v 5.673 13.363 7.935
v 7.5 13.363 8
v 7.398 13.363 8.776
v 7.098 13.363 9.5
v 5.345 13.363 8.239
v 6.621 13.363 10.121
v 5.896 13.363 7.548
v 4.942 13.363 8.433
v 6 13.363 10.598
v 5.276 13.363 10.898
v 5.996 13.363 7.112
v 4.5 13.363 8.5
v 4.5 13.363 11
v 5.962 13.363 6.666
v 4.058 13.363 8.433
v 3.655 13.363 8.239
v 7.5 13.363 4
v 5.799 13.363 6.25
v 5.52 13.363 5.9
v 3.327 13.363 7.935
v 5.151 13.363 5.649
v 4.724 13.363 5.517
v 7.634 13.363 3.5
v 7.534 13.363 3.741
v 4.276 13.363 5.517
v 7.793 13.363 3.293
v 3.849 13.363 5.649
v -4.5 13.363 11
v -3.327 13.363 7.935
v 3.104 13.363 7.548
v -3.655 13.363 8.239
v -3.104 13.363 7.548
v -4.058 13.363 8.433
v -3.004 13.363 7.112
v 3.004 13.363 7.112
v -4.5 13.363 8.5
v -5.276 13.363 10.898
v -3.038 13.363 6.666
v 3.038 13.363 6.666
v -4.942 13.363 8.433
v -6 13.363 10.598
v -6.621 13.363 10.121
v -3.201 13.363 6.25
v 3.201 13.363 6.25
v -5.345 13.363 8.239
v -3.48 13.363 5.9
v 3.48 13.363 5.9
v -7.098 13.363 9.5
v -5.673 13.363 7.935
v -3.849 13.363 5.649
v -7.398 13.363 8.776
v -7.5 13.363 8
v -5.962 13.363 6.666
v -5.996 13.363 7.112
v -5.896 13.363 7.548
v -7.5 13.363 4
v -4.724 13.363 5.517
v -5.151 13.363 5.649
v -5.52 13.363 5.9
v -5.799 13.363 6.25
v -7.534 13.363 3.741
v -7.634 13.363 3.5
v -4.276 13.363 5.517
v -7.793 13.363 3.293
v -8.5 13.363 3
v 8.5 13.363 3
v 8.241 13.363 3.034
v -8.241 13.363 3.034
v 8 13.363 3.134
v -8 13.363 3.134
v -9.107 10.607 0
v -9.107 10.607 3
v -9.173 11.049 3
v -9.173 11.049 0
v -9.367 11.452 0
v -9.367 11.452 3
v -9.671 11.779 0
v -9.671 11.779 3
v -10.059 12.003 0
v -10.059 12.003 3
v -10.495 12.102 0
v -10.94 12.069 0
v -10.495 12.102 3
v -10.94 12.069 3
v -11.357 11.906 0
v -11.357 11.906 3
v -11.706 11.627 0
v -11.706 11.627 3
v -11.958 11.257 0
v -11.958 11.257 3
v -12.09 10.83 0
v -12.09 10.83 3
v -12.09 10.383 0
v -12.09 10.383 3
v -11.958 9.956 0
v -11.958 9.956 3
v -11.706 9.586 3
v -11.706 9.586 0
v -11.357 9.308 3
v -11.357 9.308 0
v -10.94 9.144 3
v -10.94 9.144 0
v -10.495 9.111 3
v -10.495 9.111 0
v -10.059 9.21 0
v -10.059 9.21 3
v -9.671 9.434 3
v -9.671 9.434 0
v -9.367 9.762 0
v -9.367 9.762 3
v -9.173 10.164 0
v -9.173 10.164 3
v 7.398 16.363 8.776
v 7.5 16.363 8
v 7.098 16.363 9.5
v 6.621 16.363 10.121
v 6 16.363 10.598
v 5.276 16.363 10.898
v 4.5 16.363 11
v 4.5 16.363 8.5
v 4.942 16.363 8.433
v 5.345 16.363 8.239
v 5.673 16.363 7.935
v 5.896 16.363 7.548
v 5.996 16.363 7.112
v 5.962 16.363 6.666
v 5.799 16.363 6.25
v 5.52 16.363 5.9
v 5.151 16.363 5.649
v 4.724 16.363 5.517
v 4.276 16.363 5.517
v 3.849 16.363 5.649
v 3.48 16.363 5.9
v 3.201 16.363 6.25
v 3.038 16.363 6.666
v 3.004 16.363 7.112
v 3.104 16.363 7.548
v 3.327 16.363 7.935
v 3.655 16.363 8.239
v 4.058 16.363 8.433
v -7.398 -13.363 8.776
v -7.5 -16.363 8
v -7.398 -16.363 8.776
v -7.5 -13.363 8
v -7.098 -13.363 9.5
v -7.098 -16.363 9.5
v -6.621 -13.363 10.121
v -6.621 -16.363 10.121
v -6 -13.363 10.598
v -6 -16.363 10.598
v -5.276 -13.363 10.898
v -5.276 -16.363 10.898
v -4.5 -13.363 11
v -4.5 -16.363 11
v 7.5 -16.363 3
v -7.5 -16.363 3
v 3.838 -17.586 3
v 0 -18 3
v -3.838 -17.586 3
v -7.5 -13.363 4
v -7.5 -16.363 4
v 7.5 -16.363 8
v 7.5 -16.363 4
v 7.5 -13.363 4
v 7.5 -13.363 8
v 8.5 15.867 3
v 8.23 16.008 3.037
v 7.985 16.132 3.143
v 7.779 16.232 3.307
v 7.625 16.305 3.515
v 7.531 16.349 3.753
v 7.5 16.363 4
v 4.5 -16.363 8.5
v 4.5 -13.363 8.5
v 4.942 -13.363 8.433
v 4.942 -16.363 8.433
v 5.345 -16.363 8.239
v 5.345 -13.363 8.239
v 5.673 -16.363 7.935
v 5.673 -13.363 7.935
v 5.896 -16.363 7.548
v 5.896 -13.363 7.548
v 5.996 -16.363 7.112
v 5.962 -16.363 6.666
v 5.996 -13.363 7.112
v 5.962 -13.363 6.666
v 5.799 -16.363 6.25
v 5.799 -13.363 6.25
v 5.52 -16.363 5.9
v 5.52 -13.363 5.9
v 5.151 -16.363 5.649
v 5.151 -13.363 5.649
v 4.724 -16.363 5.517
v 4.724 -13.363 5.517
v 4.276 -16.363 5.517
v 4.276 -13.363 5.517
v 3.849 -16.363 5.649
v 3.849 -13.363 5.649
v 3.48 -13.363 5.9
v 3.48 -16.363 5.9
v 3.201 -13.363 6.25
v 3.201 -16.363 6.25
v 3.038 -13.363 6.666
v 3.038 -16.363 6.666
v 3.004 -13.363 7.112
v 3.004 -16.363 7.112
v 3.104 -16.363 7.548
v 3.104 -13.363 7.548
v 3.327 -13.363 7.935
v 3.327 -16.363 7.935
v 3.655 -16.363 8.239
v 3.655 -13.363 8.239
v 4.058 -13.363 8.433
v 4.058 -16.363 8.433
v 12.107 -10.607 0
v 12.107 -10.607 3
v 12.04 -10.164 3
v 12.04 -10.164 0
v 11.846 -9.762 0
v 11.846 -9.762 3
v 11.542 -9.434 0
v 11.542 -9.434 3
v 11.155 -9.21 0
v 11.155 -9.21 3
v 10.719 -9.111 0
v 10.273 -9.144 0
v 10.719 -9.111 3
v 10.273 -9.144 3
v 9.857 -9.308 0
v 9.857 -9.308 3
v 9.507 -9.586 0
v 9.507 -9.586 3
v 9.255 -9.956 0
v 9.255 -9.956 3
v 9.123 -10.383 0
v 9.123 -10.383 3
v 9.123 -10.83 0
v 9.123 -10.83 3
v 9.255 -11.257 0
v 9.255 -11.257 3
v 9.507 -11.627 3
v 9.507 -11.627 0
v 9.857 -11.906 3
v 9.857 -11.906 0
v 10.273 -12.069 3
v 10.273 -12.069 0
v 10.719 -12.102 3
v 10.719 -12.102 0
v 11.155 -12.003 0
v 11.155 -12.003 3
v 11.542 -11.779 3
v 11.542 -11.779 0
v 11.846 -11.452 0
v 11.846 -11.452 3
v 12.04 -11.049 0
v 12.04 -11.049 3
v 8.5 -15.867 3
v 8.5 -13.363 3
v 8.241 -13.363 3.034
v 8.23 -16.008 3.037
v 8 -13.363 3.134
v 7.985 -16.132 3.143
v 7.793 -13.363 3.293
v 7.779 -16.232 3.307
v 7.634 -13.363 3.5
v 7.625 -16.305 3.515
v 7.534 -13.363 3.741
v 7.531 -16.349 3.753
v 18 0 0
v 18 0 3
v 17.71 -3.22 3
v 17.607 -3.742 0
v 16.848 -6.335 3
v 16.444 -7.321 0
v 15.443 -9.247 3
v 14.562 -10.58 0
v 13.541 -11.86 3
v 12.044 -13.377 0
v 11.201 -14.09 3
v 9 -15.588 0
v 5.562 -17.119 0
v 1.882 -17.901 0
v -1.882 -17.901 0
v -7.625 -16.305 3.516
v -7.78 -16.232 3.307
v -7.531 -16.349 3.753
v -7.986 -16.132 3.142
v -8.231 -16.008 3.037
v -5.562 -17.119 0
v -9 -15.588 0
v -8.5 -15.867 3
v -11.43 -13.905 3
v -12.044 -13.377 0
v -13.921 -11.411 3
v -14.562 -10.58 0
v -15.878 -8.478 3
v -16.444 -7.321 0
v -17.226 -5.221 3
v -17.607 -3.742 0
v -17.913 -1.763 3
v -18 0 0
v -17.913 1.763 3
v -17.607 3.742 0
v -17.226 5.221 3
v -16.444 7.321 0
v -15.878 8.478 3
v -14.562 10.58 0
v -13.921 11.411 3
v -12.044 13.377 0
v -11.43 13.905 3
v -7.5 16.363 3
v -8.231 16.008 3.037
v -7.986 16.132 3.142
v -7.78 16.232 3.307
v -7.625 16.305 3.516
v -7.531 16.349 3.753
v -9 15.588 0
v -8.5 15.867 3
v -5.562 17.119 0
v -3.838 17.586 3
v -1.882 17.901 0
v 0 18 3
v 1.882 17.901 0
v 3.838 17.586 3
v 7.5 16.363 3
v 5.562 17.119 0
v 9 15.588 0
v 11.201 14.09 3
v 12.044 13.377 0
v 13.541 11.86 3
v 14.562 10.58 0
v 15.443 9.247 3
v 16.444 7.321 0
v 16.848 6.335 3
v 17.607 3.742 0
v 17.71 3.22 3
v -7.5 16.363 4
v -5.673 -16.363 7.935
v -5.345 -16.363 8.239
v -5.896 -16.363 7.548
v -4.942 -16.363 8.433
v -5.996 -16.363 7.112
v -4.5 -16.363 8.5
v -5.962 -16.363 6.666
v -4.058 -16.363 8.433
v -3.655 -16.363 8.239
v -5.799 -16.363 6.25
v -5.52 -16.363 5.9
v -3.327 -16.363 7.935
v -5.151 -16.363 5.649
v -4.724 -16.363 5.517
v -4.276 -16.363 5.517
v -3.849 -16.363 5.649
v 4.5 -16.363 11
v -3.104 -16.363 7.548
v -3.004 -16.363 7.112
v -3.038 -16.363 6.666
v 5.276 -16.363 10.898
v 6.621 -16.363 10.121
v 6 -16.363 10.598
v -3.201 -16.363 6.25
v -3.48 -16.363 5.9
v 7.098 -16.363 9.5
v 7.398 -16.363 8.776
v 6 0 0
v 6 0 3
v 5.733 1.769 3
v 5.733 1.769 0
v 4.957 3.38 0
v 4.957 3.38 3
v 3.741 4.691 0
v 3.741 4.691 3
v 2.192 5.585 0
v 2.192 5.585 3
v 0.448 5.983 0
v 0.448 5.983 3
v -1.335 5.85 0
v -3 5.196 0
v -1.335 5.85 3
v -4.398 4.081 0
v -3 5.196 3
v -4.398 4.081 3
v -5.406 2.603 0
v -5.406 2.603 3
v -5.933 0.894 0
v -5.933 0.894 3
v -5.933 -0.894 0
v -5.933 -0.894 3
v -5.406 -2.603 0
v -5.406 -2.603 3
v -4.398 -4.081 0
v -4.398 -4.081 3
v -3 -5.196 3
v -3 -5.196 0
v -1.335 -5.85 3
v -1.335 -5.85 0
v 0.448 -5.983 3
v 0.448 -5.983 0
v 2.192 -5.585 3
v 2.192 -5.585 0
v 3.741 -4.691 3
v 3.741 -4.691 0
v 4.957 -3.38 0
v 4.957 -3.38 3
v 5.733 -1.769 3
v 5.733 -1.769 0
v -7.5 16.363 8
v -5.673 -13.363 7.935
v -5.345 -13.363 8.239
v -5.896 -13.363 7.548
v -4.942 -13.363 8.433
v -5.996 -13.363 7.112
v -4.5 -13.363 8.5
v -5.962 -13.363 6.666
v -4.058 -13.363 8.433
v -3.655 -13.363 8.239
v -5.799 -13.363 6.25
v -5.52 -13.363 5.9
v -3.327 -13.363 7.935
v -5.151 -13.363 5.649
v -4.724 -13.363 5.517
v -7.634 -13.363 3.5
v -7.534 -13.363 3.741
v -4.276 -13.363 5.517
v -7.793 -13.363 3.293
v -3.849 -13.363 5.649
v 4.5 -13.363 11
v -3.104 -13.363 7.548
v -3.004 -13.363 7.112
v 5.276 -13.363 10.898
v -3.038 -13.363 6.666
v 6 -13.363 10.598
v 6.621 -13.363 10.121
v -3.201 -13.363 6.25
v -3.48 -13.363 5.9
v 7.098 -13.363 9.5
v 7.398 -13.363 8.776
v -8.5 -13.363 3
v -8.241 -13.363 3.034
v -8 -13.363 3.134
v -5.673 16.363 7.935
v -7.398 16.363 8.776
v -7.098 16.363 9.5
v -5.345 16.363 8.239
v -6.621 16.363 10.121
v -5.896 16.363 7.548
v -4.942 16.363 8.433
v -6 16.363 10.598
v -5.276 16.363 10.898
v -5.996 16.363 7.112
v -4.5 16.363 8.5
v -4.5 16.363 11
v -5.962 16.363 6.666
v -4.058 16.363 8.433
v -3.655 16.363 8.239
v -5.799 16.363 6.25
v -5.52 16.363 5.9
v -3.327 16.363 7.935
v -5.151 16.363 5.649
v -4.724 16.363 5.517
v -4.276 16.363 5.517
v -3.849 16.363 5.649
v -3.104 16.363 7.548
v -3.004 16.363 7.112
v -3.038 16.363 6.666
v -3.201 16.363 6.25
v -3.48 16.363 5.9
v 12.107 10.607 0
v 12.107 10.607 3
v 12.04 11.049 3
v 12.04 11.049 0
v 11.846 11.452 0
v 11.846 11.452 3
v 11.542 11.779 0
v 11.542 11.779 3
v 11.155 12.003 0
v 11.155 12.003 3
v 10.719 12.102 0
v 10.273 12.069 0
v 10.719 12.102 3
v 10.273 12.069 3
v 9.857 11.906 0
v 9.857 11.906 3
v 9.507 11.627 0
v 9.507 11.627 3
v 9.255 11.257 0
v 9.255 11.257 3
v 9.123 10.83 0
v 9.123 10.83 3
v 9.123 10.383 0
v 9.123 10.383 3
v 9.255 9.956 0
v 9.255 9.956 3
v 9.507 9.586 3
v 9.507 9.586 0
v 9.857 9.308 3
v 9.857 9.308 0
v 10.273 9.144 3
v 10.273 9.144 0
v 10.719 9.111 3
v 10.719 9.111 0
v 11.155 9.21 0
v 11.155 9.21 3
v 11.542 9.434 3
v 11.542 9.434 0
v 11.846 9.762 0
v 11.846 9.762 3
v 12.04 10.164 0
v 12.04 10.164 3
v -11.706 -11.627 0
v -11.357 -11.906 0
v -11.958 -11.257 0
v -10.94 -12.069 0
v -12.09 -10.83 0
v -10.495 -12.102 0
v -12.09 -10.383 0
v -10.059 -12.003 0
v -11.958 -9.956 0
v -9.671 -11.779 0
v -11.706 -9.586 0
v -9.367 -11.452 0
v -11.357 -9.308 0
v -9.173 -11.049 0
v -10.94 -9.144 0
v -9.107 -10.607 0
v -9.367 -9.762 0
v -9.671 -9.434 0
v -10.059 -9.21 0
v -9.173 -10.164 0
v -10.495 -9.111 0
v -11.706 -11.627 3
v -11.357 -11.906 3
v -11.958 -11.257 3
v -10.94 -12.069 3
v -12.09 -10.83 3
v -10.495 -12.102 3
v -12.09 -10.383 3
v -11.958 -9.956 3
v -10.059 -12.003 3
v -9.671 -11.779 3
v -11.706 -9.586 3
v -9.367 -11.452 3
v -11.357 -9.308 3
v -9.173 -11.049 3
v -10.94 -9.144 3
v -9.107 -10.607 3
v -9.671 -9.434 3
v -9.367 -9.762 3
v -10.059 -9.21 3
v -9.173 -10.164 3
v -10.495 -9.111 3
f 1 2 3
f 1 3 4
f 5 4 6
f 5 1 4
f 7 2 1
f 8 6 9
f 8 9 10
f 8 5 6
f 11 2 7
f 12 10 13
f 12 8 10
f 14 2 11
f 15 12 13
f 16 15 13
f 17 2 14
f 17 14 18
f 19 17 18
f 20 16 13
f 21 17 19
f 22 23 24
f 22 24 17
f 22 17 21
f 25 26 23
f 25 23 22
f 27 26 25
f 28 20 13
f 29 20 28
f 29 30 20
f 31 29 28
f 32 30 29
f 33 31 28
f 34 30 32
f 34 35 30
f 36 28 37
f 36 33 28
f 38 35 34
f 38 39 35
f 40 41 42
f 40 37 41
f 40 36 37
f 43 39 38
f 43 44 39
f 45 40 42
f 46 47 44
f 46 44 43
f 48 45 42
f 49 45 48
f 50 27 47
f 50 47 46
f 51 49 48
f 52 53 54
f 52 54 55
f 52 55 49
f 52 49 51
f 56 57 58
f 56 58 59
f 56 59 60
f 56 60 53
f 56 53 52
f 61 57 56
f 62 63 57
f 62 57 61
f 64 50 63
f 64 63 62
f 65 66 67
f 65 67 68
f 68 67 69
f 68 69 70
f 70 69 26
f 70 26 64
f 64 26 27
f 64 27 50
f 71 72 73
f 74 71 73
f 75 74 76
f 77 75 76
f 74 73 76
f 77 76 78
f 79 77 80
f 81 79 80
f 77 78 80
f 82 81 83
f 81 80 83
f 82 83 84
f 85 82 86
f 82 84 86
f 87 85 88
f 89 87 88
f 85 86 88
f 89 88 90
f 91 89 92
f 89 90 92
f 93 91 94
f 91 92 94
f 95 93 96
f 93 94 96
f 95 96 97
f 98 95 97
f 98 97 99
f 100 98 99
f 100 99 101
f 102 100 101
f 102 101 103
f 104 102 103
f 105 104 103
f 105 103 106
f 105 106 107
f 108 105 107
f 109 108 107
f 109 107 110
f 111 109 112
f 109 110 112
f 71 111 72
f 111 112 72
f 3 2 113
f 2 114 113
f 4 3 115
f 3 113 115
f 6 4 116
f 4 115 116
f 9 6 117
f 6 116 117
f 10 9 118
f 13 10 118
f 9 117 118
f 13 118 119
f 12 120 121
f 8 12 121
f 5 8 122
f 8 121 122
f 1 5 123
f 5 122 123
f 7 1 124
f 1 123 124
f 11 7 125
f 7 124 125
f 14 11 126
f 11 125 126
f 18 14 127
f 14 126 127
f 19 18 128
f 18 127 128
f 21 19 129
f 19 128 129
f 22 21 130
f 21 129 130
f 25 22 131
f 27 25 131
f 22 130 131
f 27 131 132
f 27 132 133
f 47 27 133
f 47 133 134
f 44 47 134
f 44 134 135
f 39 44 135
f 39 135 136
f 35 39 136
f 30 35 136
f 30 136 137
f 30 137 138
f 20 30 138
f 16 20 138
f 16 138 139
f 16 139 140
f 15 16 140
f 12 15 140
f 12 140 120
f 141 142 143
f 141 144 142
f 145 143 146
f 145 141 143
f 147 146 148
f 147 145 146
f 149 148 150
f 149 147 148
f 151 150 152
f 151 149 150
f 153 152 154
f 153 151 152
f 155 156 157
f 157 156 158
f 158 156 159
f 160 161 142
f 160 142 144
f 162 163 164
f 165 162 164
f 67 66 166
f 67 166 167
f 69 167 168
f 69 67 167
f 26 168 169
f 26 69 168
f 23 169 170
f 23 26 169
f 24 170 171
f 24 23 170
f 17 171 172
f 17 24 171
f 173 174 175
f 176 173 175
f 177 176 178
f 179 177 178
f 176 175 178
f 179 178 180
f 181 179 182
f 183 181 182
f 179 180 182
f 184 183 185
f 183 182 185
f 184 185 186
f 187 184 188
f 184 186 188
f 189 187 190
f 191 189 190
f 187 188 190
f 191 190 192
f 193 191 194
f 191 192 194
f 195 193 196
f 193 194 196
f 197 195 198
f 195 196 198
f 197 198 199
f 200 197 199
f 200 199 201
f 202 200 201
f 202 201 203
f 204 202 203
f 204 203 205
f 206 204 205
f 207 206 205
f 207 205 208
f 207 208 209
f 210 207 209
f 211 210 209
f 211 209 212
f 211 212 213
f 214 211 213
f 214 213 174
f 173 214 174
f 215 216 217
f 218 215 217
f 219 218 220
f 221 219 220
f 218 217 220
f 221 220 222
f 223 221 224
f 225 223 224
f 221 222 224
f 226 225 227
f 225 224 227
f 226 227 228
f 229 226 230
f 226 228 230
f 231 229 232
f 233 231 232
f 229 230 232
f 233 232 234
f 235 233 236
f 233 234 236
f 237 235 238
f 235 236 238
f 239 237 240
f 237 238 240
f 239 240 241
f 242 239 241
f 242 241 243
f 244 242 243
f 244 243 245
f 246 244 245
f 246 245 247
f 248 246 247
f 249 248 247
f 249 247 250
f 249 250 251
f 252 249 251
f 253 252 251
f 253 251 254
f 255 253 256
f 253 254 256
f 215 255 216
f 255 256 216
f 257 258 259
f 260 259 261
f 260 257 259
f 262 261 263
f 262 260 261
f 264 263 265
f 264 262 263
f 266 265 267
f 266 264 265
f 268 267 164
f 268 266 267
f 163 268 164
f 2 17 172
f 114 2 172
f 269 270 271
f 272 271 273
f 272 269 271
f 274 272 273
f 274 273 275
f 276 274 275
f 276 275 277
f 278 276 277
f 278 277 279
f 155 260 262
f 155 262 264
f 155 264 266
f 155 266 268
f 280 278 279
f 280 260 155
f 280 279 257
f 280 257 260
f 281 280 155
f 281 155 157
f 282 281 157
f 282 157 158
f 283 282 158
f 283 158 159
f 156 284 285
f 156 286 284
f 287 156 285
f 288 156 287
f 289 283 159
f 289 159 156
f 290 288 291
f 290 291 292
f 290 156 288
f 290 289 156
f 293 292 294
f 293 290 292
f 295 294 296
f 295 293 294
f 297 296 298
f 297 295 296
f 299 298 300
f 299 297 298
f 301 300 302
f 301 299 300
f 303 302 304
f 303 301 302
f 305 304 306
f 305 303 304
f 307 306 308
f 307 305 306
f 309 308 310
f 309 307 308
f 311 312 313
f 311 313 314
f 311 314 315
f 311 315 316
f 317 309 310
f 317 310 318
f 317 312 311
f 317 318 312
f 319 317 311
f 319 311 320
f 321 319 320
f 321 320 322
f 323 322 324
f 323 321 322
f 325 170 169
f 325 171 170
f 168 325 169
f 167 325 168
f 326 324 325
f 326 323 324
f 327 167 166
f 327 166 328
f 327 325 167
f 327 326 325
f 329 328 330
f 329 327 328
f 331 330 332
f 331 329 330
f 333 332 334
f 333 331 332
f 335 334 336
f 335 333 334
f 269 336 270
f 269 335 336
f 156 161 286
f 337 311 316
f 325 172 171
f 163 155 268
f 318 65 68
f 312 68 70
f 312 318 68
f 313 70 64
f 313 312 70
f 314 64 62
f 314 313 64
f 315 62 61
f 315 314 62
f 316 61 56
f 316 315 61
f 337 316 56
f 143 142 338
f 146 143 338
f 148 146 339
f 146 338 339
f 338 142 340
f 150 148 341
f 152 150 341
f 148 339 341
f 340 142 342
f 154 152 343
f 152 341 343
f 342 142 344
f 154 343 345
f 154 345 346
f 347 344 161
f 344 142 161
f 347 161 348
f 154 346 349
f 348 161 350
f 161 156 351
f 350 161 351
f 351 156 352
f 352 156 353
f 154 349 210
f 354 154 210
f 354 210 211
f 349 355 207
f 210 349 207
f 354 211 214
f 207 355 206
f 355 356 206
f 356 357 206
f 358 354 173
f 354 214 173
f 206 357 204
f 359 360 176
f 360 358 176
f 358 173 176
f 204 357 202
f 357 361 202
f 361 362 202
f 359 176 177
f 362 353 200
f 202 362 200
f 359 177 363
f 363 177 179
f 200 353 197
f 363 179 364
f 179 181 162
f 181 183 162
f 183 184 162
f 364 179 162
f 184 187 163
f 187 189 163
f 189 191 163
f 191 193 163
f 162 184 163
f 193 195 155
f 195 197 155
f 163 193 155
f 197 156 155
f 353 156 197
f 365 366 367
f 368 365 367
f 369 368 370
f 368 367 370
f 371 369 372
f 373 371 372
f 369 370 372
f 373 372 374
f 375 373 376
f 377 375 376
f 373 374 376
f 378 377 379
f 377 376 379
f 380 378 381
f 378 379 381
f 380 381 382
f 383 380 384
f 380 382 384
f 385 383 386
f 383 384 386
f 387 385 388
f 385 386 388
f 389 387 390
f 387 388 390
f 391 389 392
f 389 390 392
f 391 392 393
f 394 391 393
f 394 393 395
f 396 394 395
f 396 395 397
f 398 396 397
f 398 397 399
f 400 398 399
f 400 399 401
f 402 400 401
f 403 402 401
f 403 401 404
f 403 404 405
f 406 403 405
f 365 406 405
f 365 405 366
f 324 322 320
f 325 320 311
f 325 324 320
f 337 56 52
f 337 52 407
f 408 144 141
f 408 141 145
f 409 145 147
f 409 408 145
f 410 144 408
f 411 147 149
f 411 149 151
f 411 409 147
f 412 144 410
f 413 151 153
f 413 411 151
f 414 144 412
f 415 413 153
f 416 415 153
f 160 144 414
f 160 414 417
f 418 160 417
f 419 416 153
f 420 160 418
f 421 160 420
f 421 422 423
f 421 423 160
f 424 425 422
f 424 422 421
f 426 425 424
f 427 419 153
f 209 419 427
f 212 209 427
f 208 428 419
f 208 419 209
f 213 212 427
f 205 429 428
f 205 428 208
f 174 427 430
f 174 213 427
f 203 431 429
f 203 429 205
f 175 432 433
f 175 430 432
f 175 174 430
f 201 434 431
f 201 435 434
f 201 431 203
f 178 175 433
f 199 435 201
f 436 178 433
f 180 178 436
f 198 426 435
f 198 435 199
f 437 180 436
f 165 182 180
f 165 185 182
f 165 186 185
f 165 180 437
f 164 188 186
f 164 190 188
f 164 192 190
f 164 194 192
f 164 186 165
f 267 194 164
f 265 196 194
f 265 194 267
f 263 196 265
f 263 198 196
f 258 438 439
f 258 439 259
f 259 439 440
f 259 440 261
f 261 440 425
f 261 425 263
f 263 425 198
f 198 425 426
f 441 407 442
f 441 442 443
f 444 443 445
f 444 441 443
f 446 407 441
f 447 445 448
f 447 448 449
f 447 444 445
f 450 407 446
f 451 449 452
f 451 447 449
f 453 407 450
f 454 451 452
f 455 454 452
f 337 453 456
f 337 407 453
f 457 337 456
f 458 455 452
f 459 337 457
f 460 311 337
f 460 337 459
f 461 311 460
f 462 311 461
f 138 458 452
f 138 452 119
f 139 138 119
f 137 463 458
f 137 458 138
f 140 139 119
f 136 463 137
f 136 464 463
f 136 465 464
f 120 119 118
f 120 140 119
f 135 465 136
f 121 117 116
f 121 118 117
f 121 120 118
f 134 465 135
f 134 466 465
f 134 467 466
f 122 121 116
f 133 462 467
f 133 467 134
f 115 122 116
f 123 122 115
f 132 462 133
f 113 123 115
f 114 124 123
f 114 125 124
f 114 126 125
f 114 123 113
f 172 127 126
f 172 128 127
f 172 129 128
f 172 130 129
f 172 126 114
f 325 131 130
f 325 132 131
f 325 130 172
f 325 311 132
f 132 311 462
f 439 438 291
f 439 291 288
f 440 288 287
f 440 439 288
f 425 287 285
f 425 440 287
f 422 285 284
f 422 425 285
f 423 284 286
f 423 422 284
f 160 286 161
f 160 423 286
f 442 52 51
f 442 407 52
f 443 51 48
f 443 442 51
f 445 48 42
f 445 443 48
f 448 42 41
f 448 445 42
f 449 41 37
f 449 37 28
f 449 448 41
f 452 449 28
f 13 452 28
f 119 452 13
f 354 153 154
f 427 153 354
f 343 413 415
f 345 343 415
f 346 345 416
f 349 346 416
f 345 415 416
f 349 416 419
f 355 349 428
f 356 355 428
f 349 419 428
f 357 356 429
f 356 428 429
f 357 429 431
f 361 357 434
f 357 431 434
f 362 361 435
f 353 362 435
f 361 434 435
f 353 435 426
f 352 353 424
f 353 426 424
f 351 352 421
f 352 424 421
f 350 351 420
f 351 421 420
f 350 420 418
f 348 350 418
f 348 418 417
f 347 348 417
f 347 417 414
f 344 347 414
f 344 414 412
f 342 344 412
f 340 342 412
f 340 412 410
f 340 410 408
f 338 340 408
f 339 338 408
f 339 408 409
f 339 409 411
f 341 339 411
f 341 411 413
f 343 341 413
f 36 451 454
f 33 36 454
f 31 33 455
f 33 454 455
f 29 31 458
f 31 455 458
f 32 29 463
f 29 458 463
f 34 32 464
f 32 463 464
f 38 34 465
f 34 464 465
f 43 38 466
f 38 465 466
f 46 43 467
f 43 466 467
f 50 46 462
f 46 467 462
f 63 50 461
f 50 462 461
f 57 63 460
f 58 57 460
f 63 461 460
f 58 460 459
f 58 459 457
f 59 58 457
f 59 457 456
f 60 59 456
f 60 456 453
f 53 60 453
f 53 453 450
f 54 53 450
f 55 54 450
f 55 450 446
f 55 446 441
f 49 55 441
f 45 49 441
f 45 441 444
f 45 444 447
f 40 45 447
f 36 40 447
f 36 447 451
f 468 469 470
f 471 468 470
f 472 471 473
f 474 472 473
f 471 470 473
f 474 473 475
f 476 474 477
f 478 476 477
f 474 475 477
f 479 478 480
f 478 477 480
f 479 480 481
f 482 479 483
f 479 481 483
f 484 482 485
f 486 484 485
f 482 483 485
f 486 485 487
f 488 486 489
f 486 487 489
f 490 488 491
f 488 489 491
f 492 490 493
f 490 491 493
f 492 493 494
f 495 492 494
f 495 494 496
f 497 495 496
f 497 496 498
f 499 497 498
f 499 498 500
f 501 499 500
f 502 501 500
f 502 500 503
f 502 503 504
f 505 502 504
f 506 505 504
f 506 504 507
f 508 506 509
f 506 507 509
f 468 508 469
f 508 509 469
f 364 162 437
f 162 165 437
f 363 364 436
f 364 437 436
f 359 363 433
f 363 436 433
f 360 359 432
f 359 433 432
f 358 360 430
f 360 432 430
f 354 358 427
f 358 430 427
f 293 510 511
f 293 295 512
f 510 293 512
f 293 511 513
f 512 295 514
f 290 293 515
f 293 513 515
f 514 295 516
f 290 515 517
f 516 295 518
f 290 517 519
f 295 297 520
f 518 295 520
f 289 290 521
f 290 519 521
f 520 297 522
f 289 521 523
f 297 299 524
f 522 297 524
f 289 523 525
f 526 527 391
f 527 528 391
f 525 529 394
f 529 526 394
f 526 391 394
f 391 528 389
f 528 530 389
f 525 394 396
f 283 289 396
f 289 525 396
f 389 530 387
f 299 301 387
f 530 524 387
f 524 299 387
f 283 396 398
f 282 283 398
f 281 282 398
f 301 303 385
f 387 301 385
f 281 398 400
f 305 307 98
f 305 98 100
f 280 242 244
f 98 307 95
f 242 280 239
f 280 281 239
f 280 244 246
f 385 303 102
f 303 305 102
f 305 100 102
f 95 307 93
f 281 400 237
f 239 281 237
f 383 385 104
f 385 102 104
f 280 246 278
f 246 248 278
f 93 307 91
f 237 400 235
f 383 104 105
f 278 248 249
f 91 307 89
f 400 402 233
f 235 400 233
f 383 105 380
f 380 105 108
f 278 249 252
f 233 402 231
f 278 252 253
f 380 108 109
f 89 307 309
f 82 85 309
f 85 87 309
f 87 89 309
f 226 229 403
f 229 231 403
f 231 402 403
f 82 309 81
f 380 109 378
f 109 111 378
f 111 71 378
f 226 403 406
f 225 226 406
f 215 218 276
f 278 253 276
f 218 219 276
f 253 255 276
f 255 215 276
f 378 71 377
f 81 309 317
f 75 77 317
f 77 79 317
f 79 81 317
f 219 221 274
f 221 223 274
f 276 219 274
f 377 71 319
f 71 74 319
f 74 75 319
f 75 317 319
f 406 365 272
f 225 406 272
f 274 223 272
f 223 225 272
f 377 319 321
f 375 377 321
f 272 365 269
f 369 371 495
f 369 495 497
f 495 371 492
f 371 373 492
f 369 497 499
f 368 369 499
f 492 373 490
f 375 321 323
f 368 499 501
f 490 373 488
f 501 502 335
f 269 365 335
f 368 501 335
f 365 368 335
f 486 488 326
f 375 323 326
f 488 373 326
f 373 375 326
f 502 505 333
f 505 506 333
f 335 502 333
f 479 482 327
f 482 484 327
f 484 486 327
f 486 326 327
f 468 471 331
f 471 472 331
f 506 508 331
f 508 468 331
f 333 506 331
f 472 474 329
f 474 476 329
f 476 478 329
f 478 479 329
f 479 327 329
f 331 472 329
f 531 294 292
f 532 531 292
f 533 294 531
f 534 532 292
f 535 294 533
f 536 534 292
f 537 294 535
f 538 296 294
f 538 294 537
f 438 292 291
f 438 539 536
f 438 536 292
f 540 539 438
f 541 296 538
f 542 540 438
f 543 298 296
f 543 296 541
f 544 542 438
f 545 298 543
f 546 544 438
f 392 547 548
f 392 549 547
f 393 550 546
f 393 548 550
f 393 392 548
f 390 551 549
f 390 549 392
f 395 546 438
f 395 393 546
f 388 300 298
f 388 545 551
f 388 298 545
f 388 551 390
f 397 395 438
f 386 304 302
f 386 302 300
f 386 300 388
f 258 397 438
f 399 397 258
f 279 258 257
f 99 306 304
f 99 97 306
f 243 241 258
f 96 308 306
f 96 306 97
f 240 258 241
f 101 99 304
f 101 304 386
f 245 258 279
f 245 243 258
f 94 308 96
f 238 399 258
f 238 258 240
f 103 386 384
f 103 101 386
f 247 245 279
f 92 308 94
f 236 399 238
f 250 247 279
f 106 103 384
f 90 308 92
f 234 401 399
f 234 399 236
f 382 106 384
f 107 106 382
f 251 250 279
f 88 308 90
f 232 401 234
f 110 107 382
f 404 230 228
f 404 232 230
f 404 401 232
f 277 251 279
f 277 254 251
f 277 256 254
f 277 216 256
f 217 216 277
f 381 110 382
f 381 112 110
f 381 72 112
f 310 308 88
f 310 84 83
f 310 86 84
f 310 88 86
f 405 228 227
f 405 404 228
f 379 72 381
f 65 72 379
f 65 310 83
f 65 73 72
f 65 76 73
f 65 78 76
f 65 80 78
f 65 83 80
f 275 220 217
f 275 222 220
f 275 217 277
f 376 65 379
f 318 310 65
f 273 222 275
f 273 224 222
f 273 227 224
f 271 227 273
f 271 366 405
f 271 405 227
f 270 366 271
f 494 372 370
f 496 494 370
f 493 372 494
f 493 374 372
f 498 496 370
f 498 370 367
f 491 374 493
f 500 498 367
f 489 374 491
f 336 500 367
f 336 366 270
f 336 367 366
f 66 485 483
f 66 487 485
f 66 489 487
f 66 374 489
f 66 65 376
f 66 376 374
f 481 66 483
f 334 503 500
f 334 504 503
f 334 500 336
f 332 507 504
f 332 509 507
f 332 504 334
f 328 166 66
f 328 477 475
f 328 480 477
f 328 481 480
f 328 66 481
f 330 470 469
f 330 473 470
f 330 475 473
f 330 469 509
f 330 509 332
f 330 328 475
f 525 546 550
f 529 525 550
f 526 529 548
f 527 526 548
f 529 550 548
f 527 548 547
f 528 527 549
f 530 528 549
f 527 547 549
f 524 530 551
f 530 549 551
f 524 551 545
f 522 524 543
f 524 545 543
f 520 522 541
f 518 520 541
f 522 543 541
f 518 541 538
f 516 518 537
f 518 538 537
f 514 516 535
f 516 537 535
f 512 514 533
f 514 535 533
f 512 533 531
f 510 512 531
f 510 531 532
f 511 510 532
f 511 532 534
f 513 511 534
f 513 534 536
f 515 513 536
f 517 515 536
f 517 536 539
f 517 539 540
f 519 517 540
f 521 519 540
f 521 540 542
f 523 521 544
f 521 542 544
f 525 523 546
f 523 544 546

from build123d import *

# Parameters (mm, degrees)
SKETCH_1_R          = 18
EXTRUDE_1_DEPTH     = 3
SKETCH_2_R          = 1.5
CUT_EXTRUDE_1_DEPTH = 3
SKETCH_4_W          = 15
SKETCH_4_H          = 3
EXTRUDE_2_DEPTH     = 8
SKETCH_5_R          = 1.5
CUT_EXTRUDE_2_DEPTH = 37
FILLET_1_R          = 3
FILLET_2_R          = 1
SKETCH_6_R          = 6
CUT_EXTRUDE_3_DEPTH = 37


with BuildPart() as part:
    # Эскиз1 → Бобышка-Вытянуть1 (new body)
    with BuildSketch(Plane.XY):
        Circle(SKETCH_1_R)
    extrude(amount=EXTRUDE_1_DEPTH)

    # Эскиз2 → Вырез-Вытянуть1 (cut)
    with BuildSketch(Plane.XY.offset(3)):
        with Locations((-10.606601718, -10.606601718)):
            Circle(SKETCH_2_R)
        with Locations((10.606601718, -10.606601718)):
            Circle(SKETCH_2_R)
        with Locations((10.606601718, 10.606601718)):
            Circle(SKETCH_2_R)
        with Locations((-10.606601718, 10.606601718)):
            Circle(SKETCH_2_R)
    extrude(amount=-CUT_EXTRUDE_1_DEPTH, mode=Mode.SUBTRACT)

    # Эскиз4 → Бобышка-Вытянуть2 (add)
    with BuildSketch(Plane.XY.offset(3)):
        with Locations((0, 14.863068172)):
            Rectangle(SKETCH_4_W, SKETCH_4_H)
        with Locations((0, -14.863068172)):
            Rectangle(SKETCH_4_W, SKETCH_4_H)
    extrude(amount=EXTRUDE_2_DEPTH)

    # Эскиз5 → Вырез-Вытянуть2 (cut)
    with BuildSketch(Plane(origin=(0, 16.363068172, 0), x_dir=(1, 0, 0), z_dir=(0, 1, 0))):
        with Locations(Location((-4.5, -7, 0), (0, 0, 270))):
            Circle(SKETCH_5_R)
        with Locations(Location((4.5, -7, 0), (0, 0, 270))):
            Circle(SKETCH_5_R)
    extrude(amount=-CUT_EXTRUDE_2_DEPTH, mode=Mode.SUBTRACT)

    # Скругление1
    fillet_1_edges = [part.edges().sort_by_distance(p)[0] for p in [
        (-7.5, 14.863068172, 11),
        (7.5, 14.863068172, 11),
        (7.5, -14.863068172, 11),
        (-7.5, -14.863068172, 11),
    ]]
    fillet(fillet_1_edges, radius=FILLET_1_R)

    # Скругление2
    # the kernel refuses this fillet: 1 mm, written as the material it adds along each edge
    with BuildSketch(Plane(origin=(-7.5, 16.363068172, 3), x_dir=(-1, 0, 0), z_dir=(0, -1, 0))) as fillet_2_piece_1_section:
        with BuildLine():
            CenterArc((FILLET_2_R, -FILLET_2_R), FILLET_2_R, 90, 90)
            Line((0, -FILLET_2_R), (0, 0))
            Line((0, 0), (FILLET_2_R, 0))
        make_face()
    fillet_2_piece_1 = extrude(amount=3, mode=Mode.PRIVATE)
    fillet_2_piece_1 = fillet_2_piece_1 & Plane(origin=(0, 0, 3.230923565), x_dir=(1, 0, 0), z_dir=(0, 0, -1)) * Cylinder(18, 11, mode=Mode.PRIVATE)
    add(fillet_2_piece_1)
    with BuildSketch(Plane(origin=(7.5, 13.363068172, 3), x_dir=(1, 0, 0), z_dir=(0, 1, 0))) as fillet_2_piece_2_section:
        with BuildLine():
            CenterArc((FILLET_2_R, -FILLET_2_R), FILLET_2_R, 90, 90)
            Line((0, -FILLET_2_R), (0, 0))
            Line((0, 0), (FILLET_2_R, 0))
        make_face()
    fillet_2_piece_2 = extrude(amount=3, mode=Mode.PRIVATE)
    fillet_2_piece_2 = fillet_2_piece_2 & Plane(origin=(0, 0, 3.230923565), x_dir=(1, 0, 0), z_dir=(0, 0, -1)) * Cylinder(18, 10, mode=Mode.PRIVATE)
    add(fillet_2_piece_2)
    with BuildSketch(Plane(origin=(7.5, -16.363068172, 3), x_dir=(0, 0, 1), z_dir=(0, 1, 0))) as fillet_2_piece_3_section:
        with BuildLine():
            CenterArc((FILLET_2_R, FILLET_2_R), FILLET_2_R, 180, 90)
            Line((0, FILLET_2_R), (0, 0))
            Line((0, 0), (FILLET_2_R, 0))
        make_face()
    fillet_2_piece_3 = extrude(amount=3, mode=Mode.PRIVATE)
    fillet_2_piece_3 = fillet_2_piece_3 & Plane(origin=(0, 0, 3.230923542), x_dir=(1, 0, 0), z_dir=(0, 0, -1)) * Cylinder(18, 10, mode=Mode.PRIVATE)
    add(fillet_2_piece_3)
    with BuildSketch(Plane(origin=(-7.5, -13.363068172, 3), x_dir=(-1, 0, 0), z_dir=(0, -1, 0))) as fillet_2_piece_4_section:
        with BuildLine():
            CenterArc((FILLET_2_R, -FILLET_2_R), FILLET_2_R, 90, 90)
            Line((0, -FILLET_2_R), (0, 0))
            Line((0, 0), (FILLET_2_R, 0))
        make_face()
    fillet_2_piece_4 = extrude(amount=3, mode=Mode.PRIVATE)
    fillet_2_piece_4 = fillet_2_piece_4 & Plane(origin=(0, 0, 3.230923565), x_dir=(1, 0, 0), z_dir=(0, 0, -1)) * Cylinder(18, 11, mode=Mode.PRIVATE)
    add(fillet_2_piece_4)

    # Эскиз6 → Вырез-Вытянуть3 (cut)
    with BuildSketch(Plane.XY.offset(3)):
        Circle(SKETCH_6_R)
    extrude(amount=-CUT_EXTRUDE_3_DEPTH, mode=Mode.SUBTRACT)


solid = part.part
